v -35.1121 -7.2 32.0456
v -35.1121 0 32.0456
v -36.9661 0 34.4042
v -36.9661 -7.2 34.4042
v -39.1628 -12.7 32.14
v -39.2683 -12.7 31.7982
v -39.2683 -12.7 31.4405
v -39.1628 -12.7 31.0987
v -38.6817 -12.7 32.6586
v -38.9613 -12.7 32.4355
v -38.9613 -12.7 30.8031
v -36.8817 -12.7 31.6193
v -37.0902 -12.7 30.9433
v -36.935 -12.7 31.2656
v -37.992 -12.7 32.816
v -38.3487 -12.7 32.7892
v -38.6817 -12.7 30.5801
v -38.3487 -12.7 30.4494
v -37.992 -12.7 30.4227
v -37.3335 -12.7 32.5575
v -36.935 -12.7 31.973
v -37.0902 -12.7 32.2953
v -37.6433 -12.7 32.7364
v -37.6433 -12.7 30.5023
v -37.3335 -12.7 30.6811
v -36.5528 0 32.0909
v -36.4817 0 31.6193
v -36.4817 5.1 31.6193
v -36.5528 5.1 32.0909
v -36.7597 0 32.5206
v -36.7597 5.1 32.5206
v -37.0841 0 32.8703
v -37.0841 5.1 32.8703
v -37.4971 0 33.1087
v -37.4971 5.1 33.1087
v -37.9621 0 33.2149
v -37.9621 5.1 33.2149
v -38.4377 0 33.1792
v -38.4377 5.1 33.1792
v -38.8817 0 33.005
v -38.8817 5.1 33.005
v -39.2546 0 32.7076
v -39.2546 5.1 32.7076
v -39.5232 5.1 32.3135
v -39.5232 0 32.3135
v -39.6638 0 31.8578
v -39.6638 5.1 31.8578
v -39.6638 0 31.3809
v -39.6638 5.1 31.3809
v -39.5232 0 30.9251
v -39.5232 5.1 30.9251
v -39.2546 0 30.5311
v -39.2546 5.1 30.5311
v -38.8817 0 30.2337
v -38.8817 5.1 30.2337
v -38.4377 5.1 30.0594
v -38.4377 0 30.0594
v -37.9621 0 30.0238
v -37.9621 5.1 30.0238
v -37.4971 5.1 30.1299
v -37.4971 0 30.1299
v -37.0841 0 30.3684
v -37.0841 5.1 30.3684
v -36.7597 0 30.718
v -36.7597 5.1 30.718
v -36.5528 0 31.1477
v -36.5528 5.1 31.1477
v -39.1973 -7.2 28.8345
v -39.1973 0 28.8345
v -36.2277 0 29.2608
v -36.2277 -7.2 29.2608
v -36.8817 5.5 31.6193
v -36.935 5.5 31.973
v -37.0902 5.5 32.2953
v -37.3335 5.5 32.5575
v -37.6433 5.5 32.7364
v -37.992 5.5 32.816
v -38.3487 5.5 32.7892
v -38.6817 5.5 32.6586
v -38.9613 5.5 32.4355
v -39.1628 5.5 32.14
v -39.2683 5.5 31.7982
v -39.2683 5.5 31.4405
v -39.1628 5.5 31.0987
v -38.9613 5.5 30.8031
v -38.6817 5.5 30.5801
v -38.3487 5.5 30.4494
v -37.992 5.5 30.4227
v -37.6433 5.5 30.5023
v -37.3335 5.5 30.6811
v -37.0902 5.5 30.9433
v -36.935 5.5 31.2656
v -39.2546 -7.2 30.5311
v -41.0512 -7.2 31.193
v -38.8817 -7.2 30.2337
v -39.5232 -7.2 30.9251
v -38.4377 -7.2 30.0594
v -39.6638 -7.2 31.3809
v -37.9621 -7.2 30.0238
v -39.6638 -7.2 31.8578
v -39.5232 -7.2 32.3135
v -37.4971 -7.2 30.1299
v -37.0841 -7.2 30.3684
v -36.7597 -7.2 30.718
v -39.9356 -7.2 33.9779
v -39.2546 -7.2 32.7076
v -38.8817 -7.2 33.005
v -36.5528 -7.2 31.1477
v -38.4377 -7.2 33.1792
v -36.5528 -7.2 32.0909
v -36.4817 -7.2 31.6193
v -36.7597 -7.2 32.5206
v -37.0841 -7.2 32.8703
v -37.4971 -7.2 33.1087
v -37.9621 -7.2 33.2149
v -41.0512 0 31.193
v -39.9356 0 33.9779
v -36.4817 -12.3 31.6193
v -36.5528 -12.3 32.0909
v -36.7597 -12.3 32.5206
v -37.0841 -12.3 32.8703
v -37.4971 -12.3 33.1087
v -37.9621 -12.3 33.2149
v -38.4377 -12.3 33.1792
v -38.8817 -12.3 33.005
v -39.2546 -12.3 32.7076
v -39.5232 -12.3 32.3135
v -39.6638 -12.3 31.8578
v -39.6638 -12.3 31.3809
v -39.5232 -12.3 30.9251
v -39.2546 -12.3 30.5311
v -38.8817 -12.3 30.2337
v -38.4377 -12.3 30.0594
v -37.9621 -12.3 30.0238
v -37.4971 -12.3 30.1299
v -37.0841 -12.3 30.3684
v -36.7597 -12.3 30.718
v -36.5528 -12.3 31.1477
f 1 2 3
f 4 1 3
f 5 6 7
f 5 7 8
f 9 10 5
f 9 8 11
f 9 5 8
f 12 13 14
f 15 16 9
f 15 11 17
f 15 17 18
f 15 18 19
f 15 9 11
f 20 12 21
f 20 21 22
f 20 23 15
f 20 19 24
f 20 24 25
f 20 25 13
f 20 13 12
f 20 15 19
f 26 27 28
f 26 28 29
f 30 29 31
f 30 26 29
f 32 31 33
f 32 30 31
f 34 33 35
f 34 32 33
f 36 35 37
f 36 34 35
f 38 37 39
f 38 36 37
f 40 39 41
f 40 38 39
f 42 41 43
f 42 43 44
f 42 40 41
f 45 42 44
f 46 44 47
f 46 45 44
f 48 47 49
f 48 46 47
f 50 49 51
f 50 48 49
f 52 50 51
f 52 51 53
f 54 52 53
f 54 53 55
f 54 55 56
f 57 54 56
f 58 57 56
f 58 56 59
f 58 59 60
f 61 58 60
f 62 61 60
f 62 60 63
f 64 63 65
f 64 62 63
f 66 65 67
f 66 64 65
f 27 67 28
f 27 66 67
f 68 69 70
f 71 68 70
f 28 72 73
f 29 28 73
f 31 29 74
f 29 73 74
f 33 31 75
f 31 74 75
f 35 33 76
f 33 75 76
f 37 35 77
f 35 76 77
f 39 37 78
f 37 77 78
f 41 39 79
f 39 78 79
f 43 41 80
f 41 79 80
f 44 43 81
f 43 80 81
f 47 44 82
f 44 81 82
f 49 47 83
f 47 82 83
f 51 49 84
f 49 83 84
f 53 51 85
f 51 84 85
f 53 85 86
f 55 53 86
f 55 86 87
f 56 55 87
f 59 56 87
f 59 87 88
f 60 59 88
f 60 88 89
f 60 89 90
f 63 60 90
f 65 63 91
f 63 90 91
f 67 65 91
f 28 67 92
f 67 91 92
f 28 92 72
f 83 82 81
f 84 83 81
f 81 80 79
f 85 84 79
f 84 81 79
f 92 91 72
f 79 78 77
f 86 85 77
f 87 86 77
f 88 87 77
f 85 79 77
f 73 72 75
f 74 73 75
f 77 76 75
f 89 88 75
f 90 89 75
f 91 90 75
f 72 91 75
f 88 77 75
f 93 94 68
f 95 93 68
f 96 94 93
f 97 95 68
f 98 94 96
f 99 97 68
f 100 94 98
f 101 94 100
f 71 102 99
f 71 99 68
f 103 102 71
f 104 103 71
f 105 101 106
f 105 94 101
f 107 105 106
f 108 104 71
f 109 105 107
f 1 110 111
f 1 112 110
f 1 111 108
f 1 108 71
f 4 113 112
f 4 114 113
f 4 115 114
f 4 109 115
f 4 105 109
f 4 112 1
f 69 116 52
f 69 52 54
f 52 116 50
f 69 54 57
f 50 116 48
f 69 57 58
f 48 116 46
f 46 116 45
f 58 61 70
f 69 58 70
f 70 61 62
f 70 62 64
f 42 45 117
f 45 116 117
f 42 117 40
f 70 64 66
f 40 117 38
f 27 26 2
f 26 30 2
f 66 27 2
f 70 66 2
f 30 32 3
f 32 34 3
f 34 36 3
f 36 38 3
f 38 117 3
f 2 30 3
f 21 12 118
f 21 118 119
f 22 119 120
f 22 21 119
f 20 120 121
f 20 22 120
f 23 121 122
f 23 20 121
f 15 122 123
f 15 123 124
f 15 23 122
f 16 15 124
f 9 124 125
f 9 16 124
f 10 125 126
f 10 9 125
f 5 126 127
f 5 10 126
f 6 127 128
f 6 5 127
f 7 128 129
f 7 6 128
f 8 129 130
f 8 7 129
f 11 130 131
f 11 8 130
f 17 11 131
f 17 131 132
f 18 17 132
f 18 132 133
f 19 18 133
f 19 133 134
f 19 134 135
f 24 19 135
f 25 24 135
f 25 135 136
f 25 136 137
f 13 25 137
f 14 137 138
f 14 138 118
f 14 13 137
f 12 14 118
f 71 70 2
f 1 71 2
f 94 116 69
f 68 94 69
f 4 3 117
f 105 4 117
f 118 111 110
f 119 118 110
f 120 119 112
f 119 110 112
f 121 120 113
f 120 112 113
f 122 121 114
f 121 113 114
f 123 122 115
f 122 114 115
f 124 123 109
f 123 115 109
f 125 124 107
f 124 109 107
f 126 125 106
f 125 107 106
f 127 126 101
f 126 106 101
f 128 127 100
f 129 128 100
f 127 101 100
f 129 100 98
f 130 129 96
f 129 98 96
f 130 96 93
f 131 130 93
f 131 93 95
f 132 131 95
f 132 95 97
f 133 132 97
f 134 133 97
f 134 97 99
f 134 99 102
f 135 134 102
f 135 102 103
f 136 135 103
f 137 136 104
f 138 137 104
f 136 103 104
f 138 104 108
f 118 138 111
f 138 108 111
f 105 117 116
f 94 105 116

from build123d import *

# Parameters (mm, degrees)
F0_R     = 1.6
F1_DEPTH = 7.2
F2_DEPTH = 5.5
F3_R     = 1.6
F4_DEPTH = 5.5
F5_SIZE  = 0.4


with BuildPart() as f1:
    # F0 (on Front) → F1 (new body)
    with BuildSketch(Plane.XZ):
        Polygon((-35.112121, 32.045641), (-36.966095, 34.404195), (-39.93565, 33.977883), (-41.051231, 31.193017), (-39.197257, 28.834463), (-36.227701, 29.260775), align=None)
        with Locations((-38.081676, 31.619329)):
            Circle(F0_R, mode=Mode.SUBTRACT)
        with Locations((-38.081676, 31.619329)):
            Circle(F0_R)
    extrude(amount=F1_DEPTH)

    # F0 (on Front) → F2 (join)
    with BuildSketch(Plane.XZ):
        with Locations((-38.081676, 31.619329)):
            Circle(F0_R)
    extrude(amount=-F2_DEPTH)

    # F3 (on face) → F4 (join)
    with BuildSketch(Plane.XZ.offset(7.2)):
        with Locations((-38.081676, 31.619329)):
            Circle(F3_R)
    extrude(amount=F4_DEPTH)

    # F5
    f5_edges = [f1.edges().sort_by_distance(p)[0] for p in [
        (-39.681676, 5.5, 31.619329),
        (-39.681676, -12.7, 31.619329),
    ]]
    chamfer(f5_edges, length=F5_SIZE)


solid = f1.part
